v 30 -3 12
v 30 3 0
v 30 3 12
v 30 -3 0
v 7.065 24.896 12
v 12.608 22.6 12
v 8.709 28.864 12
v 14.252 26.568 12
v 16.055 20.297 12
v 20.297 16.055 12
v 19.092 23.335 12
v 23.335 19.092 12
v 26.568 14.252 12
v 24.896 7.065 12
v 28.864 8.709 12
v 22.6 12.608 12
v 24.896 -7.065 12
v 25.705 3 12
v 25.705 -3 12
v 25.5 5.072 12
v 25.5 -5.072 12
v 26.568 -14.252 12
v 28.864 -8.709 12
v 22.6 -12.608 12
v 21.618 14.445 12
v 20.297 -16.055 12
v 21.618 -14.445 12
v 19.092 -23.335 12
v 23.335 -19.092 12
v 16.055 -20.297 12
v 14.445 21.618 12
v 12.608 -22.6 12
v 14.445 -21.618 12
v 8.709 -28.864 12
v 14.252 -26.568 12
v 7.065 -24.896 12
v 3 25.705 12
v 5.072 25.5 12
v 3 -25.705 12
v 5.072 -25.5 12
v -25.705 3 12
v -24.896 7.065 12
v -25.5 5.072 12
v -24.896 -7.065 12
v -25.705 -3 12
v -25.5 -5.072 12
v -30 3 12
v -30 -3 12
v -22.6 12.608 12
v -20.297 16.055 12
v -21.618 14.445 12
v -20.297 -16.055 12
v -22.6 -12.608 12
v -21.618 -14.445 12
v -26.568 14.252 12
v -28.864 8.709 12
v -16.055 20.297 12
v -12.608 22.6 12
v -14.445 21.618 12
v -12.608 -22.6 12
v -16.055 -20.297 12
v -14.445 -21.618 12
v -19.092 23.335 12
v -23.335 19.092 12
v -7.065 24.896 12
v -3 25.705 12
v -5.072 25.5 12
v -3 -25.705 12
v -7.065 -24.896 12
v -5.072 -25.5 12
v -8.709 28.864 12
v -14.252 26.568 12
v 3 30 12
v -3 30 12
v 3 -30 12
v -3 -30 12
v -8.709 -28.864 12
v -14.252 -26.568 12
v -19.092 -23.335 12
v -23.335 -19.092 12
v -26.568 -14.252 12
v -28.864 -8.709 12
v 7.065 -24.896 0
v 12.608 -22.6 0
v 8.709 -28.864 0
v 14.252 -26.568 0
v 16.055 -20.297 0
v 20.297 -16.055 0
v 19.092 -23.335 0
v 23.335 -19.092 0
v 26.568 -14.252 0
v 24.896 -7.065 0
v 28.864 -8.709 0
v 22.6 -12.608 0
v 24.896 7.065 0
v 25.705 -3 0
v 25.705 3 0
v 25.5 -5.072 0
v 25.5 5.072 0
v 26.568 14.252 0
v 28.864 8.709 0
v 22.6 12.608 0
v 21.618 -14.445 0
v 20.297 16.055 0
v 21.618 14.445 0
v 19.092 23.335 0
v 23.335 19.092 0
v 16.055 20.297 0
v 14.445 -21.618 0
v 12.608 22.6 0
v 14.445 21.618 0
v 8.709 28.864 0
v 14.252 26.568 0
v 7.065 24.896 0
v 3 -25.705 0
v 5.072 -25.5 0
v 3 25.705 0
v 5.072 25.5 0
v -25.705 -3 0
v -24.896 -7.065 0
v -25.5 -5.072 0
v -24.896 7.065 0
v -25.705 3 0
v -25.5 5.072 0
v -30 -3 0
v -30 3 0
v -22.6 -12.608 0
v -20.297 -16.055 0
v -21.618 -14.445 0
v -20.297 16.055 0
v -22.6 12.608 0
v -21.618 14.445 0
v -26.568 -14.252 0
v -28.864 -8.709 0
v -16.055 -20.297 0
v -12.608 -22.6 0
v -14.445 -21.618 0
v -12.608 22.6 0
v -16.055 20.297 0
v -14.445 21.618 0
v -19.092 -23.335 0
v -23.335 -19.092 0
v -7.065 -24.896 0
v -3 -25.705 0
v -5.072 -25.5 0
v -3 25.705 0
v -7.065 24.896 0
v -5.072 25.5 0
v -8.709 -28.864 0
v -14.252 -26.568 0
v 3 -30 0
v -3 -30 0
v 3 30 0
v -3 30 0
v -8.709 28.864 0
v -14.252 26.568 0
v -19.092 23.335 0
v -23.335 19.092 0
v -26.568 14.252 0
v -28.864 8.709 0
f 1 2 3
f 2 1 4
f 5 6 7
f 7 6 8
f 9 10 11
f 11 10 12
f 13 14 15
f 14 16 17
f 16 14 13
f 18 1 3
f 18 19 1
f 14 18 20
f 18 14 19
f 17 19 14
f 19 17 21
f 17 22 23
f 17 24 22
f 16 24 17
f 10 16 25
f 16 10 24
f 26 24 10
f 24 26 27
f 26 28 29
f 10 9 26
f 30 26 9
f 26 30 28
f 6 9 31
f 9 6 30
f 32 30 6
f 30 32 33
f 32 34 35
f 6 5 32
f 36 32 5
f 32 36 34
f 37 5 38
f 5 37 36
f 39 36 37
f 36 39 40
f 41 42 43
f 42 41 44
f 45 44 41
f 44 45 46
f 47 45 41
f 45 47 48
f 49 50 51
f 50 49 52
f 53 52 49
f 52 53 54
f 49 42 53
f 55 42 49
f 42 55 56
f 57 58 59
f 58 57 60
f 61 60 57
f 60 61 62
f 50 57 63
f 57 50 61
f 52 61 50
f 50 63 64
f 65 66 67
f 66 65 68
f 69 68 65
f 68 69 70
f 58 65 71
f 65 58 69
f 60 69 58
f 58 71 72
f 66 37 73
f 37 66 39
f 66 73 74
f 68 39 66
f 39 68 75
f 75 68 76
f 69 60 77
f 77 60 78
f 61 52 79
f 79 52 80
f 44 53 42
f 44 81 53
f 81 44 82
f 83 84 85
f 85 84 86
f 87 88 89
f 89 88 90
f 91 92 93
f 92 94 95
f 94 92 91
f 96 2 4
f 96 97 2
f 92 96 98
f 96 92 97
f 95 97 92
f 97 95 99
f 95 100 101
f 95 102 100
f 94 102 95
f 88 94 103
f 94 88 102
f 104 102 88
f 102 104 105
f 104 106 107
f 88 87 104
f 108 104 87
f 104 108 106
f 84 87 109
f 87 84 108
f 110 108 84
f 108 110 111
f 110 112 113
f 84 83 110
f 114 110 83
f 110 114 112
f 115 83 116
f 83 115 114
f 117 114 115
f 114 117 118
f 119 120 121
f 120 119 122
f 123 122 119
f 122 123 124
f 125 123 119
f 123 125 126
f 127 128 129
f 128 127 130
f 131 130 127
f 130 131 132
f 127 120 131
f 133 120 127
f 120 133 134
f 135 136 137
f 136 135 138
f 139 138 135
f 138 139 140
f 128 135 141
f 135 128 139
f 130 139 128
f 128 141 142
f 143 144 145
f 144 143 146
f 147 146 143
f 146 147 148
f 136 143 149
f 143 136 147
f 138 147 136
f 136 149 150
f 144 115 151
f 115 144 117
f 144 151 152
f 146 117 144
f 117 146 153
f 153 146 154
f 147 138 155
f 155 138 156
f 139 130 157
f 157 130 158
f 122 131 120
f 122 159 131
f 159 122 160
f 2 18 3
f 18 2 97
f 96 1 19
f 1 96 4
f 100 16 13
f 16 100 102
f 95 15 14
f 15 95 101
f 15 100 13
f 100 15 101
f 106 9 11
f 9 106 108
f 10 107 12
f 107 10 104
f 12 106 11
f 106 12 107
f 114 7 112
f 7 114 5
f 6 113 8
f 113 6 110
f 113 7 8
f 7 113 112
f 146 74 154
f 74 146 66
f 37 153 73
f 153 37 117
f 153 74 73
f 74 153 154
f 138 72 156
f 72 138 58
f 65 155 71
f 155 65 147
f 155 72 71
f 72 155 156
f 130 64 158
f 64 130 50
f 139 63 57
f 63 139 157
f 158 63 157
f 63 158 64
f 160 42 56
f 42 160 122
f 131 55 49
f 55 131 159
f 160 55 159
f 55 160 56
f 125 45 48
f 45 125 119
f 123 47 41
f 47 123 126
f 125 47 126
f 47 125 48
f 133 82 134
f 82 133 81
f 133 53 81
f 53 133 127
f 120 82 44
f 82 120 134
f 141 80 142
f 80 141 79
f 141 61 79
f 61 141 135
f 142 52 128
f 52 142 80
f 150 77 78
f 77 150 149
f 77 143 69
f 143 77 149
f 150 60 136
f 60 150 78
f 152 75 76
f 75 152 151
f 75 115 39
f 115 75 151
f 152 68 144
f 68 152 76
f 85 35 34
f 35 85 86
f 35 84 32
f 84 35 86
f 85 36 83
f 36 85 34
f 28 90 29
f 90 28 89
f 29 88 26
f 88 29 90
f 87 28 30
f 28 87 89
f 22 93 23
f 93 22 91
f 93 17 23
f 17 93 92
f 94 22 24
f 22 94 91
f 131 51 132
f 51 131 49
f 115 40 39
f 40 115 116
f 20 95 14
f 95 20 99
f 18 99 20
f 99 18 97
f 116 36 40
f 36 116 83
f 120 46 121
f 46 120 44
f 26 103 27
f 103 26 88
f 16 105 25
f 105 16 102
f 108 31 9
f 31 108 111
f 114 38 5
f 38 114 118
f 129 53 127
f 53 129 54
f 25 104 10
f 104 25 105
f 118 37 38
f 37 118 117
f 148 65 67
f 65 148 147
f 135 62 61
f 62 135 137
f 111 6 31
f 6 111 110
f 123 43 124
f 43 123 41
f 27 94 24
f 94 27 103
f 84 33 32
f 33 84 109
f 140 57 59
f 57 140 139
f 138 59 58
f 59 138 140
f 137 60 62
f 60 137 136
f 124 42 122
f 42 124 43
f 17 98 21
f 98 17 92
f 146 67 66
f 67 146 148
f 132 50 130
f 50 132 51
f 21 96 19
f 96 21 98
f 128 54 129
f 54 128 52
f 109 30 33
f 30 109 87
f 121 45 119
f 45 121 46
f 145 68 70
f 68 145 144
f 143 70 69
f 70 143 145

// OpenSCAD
$fn = 32;

// ----------------------------------------------------------------------
// Spur blank: plain gear blank
// ----------------------------------------------------------------------

// --- parameters (mm) ---
disc_r = 26;              // blank root radius
disc_t = 12;              // blank thickness
n_teeth = 16;             // stub tooth count
tooth_w = 6;              // tooth width at the root
tooth_h = 4;              // tooth height above the root
fit_tol = 0.1;            // tolerance for press fits, mm
free_tol = 0.3;           // tolerance for clearance fits, mm

out_r = disc_r + tooth_h;  // tip radius
bbox_x = 60.0;  // measured width over the teeth
bbox_y = 60.0;  // measured depth over the teeth

union() {
  cylinder(r = disc_r, h = disc_t);
  for (i = [0 : n_teeth - 1])
    rotate([0, 0, i * 360 / n_teeth])
      translate([disc_r - 1, -tooth_w / 2, 0])
        cube([tooth_h + 1, tooth_w, disc_t]);
}
